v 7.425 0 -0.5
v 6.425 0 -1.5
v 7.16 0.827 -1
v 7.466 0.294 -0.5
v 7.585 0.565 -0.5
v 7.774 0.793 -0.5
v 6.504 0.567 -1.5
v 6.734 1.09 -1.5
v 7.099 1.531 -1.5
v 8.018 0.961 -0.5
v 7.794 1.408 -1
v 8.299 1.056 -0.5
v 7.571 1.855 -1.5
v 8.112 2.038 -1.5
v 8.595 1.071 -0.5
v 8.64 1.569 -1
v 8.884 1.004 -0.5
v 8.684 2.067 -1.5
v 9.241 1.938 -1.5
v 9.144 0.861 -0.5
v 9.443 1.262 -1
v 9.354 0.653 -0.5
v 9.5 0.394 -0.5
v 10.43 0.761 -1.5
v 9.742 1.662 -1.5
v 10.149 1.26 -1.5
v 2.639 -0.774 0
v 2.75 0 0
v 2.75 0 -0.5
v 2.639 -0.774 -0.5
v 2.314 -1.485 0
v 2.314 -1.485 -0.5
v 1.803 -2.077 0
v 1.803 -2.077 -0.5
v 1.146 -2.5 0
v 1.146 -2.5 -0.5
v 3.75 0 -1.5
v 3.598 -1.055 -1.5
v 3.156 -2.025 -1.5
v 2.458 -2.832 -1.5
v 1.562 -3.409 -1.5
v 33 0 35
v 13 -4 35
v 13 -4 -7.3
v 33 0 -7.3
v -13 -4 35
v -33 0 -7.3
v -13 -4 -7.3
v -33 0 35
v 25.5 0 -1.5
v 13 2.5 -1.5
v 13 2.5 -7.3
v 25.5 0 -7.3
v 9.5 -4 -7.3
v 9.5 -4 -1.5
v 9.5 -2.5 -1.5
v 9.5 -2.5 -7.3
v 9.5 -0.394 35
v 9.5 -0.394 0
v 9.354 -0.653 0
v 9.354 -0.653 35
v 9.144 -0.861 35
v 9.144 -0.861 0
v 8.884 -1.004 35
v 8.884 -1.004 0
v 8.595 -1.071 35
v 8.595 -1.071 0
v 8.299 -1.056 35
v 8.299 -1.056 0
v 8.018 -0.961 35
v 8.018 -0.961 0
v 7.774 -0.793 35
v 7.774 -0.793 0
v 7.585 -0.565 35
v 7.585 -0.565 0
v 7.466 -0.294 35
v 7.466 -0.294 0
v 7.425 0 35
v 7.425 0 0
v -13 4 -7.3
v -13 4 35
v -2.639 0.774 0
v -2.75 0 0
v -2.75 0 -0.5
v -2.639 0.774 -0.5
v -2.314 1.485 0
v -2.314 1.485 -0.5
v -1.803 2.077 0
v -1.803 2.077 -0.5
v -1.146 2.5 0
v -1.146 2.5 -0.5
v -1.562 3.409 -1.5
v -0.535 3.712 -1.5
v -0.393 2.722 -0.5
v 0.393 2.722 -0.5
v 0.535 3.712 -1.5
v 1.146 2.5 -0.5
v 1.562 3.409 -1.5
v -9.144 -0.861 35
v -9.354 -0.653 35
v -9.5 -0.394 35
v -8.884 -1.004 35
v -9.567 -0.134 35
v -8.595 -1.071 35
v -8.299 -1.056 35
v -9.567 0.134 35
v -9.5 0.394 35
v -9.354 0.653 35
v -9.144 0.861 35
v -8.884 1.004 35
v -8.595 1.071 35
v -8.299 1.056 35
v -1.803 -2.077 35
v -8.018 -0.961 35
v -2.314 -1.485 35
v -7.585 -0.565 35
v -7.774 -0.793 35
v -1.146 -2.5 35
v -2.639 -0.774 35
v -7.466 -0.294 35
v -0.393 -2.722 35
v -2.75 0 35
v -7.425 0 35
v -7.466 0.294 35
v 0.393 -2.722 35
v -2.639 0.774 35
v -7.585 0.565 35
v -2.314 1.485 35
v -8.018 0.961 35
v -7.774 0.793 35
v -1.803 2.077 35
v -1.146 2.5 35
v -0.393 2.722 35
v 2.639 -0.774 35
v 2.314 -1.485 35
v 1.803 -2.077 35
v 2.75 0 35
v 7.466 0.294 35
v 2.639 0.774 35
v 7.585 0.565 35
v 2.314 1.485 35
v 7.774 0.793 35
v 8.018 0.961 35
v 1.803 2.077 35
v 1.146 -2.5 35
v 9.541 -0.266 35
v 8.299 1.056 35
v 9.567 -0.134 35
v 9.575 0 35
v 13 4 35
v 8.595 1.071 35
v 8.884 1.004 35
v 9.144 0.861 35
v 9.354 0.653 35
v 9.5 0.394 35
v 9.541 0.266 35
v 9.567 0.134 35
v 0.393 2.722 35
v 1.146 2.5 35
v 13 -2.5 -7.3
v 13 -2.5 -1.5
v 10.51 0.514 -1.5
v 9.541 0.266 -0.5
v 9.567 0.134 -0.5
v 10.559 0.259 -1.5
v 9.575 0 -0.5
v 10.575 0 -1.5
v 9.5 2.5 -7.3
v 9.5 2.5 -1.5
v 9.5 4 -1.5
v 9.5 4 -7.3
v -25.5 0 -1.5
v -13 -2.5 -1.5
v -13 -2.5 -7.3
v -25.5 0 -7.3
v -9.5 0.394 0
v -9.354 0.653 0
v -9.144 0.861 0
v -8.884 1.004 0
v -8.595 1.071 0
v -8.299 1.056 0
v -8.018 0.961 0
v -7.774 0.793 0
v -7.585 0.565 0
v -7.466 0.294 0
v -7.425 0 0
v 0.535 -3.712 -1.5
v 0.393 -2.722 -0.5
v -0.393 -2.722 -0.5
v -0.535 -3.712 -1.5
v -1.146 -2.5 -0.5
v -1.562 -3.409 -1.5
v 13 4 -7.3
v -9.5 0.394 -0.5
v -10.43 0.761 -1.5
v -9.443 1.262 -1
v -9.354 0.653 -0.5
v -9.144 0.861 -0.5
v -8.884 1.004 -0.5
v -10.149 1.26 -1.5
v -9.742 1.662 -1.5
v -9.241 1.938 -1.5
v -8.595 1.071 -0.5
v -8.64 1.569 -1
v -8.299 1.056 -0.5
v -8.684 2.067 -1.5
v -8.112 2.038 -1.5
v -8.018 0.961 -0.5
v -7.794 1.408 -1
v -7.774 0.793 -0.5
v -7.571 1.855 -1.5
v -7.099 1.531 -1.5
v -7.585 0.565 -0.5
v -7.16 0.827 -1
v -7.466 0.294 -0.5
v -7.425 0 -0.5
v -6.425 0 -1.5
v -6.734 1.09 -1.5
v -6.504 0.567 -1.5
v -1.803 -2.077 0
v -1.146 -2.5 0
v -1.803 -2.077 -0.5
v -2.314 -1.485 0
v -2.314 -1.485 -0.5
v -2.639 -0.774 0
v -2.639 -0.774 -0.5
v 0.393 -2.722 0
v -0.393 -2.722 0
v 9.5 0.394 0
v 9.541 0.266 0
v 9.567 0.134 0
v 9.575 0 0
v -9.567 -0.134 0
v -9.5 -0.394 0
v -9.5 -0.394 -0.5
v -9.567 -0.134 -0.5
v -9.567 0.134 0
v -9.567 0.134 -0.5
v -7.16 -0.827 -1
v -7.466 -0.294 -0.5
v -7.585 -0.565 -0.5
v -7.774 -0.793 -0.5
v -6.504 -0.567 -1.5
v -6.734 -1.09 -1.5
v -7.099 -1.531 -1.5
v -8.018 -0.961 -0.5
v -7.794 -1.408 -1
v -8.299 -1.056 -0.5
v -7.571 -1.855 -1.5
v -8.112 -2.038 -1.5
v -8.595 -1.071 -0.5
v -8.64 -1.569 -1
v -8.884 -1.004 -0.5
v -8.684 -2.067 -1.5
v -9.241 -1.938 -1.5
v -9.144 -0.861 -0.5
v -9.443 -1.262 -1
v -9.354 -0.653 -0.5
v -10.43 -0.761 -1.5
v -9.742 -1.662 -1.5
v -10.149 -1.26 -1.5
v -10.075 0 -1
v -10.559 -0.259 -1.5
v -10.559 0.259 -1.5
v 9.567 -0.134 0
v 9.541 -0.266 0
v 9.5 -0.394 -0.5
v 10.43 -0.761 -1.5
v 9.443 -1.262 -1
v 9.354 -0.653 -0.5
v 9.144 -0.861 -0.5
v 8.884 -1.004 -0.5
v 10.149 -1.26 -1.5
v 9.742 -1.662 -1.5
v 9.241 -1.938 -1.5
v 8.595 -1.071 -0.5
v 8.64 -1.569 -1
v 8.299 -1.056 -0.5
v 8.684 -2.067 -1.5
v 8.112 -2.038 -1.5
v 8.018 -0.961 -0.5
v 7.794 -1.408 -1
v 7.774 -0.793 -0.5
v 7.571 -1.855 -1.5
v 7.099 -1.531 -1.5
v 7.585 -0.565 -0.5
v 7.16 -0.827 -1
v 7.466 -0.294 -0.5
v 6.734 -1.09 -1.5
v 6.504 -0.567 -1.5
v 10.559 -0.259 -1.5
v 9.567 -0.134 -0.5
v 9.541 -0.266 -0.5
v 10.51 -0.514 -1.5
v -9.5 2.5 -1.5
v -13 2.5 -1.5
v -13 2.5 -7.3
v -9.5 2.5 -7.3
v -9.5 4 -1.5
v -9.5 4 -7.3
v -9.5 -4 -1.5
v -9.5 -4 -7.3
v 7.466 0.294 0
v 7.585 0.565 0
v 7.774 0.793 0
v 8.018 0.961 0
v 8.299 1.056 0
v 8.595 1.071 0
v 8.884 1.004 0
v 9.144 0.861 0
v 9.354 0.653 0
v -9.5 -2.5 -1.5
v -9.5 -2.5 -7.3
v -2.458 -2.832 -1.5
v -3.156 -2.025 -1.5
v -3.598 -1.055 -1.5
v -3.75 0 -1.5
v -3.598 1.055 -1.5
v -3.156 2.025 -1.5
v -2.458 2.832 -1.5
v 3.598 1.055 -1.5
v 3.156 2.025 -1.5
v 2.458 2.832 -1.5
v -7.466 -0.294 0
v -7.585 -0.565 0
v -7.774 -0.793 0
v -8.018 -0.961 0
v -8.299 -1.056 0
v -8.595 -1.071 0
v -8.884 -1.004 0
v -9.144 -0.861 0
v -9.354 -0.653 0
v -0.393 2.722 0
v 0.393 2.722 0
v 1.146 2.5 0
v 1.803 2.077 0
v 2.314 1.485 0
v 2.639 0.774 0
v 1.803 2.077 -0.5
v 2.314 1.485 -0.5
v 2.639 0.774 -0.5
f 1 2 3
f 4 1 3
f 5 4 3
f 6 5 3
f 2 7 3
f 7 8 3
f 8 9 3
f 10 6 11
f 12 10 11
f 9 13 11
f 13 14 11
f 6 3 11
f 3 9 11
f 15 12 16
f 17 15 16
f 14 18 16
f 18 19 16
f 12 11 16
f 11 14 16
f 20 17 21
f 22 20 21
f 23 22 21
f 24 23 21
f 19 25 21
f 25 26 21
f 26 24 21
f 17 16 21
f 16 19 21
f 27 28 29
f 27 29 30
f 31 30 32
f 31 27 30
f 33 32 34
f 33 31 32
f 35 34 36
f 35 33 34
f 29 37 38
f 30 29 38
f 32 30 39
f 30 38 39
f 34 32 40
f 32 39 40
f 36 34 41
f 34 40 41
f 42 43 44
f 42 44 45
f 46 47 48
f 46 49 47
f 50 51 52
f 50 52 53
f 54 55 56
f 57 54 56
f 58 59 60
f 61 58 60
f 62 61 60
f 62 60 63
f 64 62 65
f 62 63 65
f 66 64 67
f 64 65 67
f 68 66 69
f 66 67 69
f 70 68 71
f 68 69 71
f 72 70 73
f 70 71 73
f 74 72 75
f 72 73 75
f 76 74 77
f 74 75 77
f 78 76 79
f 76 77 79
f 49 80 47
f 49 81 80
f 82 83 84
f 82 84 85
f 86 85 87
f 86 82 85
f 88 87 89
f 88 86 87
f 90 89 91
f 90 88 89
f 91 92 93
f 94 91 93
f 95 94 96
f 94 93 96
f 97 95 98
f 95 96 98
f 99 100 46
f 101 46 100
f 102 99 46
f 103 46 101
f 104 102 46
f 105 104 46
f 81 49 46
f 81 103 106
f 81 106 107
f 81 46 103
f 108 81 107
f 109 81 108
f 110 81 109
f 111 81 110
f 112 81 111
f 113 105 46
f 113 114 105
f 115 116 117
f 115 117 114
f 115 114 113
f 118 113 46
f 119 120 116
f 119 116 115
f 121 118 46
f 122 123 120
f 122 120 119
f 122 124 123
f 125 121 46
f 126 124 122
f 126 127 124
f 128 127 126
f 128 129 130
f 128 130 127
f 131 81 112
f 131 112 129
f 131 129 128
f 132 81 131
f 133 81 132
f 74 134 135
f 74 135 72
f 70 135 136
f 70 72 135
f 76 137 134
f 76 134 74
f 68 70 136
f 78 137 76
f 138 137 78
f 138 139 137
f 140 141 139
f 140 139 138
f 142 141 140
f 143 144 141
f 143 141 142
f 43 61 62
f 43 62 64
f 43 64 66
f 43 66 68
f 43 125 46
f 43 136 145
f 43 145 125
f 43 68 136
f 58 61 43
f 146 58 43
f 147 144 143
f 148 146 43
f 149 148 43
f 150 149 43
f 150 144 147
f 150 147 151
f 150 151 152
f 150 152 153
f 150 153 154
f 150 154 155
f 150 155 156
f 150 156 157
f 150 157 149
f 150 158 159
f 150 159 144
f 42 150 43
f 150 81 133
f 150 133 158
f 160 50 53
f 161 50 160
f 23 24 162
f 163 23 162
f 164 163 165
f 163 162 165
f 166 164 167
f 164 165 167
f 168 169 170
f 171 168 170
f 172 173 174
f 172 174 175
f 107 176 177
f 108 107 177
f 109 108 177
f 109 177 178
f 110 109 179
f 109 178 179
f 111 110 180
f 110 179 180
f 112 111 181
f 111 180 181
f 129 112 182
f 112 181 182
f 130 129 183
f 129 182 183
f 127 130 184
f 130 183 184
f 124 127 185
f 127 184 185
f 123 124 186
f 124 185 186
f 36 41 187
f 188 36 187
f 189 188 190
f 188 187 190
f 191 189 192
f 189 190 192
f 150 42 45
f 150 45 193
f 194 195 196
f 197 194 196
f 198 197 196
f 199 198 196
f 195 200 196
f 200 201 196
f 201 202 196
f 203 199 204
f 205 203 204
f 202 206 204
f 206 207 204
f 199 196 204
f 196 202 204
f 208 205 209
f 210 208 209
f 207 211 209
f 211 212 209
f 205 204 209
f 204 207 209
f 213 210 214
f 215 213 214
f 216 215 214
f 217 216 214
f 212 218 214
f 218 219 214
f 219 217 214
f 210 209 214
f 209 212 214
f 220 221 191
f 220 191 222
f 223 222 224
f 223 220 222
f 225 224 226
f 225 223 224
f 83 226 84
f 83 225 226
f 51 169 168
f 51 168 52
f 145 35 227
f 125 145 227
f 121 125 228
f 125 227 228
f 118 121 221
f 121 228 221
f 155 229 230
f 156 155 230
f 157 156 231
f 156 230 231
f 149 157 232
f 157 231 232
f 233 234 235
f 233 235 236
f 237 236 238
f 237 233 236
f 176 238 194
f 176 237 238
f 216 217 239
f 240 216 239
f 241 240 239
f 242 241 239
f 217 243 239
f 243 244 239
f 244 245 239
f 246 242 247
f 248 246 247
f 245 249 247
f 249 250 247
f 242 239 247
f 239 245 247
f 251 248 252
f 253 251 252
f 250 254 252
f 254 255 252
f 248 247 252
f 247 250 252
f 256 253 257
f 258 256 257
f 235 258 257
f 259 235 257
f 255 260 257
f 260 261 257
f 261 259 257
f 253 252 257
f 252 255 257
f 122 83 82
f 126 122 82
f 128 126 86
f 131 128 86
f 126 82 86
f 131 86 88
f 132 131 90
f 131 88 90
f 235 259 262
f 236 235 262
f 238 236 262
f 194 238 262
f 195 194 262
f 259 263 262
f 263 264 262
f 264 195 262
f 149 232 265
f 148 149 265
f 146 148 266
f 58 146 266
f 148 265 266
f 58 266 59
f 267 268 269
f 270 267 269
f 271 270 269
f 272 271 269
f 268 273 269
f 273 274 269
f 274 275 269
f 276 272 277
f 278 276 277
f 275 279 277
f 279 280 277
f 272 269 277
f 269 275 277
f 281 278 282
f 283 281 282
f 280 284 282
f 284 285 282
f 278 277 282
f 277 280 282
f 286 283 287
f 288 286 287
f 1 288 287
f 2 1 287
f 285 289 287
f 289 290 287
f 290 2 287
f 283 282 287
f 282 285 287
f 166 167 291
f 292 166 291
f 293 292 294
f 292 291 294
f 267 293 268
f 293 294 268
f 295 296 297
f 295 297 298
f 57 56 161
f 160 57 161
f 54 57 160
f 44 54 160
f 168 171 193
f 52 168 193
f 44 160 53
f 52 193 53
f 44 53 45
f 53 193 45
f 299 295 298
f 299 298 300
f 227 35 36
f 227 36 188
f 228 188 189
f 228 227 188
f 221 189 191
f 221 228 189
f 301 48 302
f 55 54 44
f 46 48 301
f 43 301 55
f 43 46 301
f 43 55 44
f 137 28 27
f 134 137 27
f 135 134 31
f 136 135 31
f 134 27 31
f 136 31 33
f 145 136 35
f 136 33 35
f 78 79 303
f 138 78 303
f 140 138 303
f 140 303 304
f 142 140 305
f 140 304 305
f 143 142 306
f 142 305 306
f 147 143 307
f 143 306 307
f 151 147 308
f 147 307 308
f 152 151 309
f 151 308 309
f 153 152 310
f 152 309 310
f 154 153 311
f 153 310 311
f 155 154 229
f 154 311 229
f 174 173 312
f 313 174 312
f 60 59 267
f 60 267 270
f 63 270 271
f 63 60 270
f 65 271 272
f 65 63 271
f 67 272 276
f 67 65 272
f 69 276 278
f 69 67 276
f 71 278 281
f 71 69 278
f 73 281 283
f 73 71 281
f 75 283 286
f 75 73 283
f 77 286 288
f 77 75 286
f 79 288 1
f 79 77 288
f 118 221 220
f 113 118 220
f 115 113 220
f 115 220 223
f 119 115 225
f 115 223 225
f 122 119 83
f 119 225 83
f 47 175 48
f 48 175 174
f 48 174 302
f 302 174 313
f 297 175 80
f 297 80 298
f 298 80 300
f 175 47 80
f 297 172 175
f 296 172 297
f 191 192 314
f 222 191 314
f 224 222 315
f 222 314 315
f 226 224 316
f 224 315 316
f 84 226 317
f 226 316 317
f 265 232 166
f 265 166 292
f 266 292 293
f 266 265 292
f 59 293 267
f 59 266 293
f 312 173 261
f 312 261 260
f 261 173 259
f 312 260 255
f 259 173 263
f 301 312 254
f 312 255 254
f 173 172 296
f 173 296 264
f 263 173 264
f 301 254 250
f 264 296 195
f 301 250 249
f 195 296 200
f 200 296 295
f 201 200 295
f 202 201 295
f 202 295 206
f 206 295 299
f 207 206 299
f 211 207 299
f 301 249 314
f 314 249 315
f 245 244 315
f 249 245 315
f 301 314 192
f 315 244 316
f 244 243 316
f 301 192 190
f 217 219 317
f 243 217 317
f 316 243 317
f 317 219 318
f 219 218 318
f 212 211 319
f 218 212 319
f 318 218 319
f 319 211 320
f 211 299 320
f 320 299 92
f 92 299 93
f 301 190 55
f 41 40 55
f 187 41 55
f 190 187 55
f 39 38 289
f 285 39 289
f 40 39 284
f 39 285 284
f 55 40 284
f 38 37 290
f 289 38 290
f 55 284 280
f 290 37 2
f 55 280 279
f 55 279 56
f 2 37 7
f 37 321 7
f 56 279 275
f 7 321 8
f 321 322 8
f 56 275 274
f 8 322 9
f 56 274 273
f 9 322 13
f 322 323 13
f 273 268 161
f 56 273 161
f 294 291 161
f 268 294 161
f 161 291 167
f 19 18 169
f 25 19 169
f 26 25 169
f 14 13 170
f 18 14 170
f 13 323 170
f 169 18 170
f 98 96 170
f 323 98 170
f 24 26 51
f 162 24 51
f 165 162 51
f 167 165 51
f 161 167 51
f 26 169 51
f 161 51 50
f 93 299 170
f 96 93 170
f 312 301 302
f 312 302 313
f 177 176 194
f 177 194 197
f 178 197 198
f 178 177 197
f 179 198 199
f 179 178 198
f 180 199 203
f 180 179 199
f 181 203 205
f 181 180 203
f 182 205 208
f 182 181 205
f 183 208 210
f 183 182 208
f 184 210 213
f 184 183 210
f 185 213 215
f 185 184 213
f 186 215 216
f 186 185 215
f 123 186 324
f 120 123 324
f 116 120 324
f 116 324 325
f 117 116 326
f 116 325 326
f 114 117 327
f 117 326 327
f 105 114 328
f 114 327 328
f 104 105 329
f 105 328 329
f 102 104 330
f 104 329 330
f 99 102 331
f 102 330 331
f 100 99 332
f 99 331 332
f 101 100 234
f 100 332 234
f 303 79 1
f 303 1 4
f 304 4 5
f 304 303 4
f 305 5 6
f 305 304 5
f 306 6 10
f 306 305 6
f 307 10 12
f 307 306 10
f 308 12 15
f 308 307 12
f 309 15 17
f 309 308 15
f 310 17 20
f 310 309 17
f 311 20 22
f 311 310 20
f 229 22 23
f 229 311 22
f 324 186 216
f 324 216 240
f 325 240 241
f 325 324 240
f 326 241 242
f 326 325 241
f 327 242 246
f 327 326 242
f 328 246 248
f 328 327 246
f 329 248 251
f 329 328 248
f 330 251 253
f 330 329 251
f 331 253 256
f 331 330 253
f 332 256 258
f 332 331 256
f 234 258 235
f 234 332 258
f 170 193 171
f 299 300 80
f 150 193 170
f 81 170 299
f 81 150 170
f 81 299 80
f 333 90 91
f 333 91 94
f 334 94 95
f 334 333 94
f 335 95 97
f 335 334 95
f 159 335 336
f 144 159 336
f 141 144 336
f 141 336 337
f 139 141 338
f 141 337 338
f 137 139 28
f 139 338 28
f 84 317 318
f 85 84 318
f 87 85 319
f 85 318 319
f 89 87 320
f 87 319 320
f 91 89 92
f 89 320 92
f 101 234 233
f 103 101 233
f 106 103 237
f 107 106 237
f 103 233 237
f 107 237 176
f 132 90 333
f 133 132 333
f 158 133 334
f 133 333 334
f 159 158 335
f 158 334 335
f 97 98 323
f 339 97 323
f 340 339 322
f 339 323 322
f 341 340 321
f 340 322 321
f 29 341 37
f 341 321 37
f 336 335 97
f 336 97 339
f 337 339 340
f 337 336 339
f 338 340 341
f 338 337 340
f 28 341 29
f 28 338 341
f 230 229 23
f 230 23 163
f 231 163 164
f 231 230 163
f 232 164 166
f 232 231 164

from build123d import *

# Parameters (mm, degrees)
F0_W     = 3.5
F0_H     = 1.5
F1_DEPTH = 35
F2_DEPTH = 1.5
F3_SIZE  = 1
F4_DEPTH = 7.3


with BuildPart() as f1:
    # F0 (on Top) → F1 (new body)
    with BuildSketch(Plane.XY):
        with BuildLine():
            ThreePointArc((-9.5, 0.394493346), (-8.2992202699, 1.0560835668), (-7.425, 0))
            Line((-7.425, 0), (-2.75, 0))
            ThreePointArc((-2.75, 0), (-2.314413618, 1.4852574204), (-1.1456439237, 2.5))
            Line((-1.1456439237, 2.5), (-9.5, 2.5))
            Line((-9.5, 2.5), (-9.5, 0.394493346))
        make_face()
        with BuildLine():
            ThreePointArc((-9.5, -0.394493346), (-9.575, 0), (-9.5, 0.394493346))
            Line((-9.5, 0.394493346), (-9.5, 2.5))
            Line((-9.5, 2.5), (-13, 2.5))
            Line((-13, 2.5), (-13, 0))
            Line((-13, 0), (-13, -2.5))
            Line((-13, -2.5), (-9.5, -2.5))
            Line((-9.5, -2.5), (-9.5, -0.394493346))
        make_face()
        with BuildLine():
            Line((-2.75, 0), (-7.425, 0))
            ThreePointArc((-7.425, 0), (-8.2992202699, -1.0560835668), (-9.5, -0.394493346))
            Line((-9.5, -0.394493346), (-9.5, -2.5))
            Line((-9.5, -2.5), (-1.1456439237, -2.5))
            ThreePointArc((-1.1456439237, -2.5), (-2.314413618, -1.4852574204), (-2.75, 0))
        make_face()
        Polygon((-13, -4), (-13, -2.5), (-25.5, 0), (-33, 0), align=None)
        Polygon((-25.5, 0), (-13, 2.5), (-13, 4), (-33, 0), align=None)
        Polygon((13, -2.5), (13, -4), (33, 0), (25.5, 0), align=None)
        Polygon((33, 0), (13, 4), (13, 2.5), (25.5, 0), align=None)
        Polygon((-25.5, 0), (-13, -2.5), (-13, 0), align=None)
        Polygon((-13, 0), (-13, 2.5), (-25.5, 0), align=None)
        with Locations((-11.25, 3.25)):
            Rectangle(F0_W, F0_H)
        with BuildLine():
            Line((-9.5, 4), (-9.5, 2.5))
            Line((-9.5, 2.5), (-1.1456439237, 2.5))
            ThreePointArc((-1.1456439237, 2.5), (0, 2.75), (1.1456439237, 2.5))
            Line((1.1456439237, 2.5), (9.5, 2.5))
            Line((9.5, 2.5), (9.5, 4))
            Line((9.5, 4), (-9.5, 4))
        make_face()
        with Locations((11.25, 3.25)):
            Rectangle(F0_W, F0_H)
        with Locations((11.25, -3.25)):
            Rectangle(F0_W, F0_H)
        with BuildLine():
            Line((-1.1456439237, -2.5), (-9.5, -2.5))
            Line((-9.5, -2.5), (-9.5, -4))
            Line((-9.5, -4), (9.5, -4))
            Line((9.5, -4), (9.5, -2.5))
            Line((9.5, -2.5), (1.1456439237, -2.5))
            ThreePointArc((1.1456439237, -2.5), (0, -2.75), (-1.1456439237, -2.5))
        make_face()
        with Locations((-11.25, -3.25)):
            Rectangle(F0_W, F0_H)
        Polygon((13, 0), (13, -2.5), (25.5, 0), align=None)
        Polygon((25.5, 0), (13, 2.5), (13, 0), align=None)
        with BuildLine():
            Line((9.5, 2.5), (9.5, 0.394493346))
            ThreePointArc((9.5, 0.394493346), (9.5560835668, 0.2007797301), (9.575, 0))
            ThreePointArc((9.575, 0), (9.5560835668, -0.2007797301), (9.5, -0.394493346))
            Line((9.5, -0.394493346), (9.5, -2.5))
            Line((9.5, -2.5), (13, -2.5))
            Line((13, -2.5), (13, 0))
            Line((13, 0), (13, 2.5))
            Line((13, 2.5), (9.5, 2.5))
        make_face()
        with BuildLine():
            ThreePointArc((1.1456439237, 2.5), (2.314413618, 1.4852574204), (2.75, 0))
            Line((2.75, 0), (7.425, 0))
            ThreePointArc((7.425, 0), (8.2992202699, 1.0560835668), (9.5, 0.394493346))
            Line((9.5, 0.394493346), (9.5, 2.5))
            Line((9.5, 2.5), (1.1456439237, 2.5))
        make_face()
        with BuildLine():
            Line((7.425, 0), (2.75, 0))
            ThreePointArc((2.75, 0), (2.314413618, -1.4852574204), (1.1456439237, -2.5))
            Line((1.1456439237, -2.5), (9.5, -2.5))
            Line((9.5, -2.5), (9.5, -0.394493346))
            ThreePointArc((9.5, -0.394493346), (8.2992202699, -1.0560835668), (7.425, 0))
        make_face()
    extrude(amount=F1_DEPTH)

    # F0 (on Top) → F2 (join)
    with BuildSketch(Plane.XY):
        Polygon((-13, -4), (-13, -2.5), (-25.5, 0), (-33, 0), align=None)
        Polygon((-25.5, 0), (-13, 2.5), (-13, 4), (-33, 0), align=None)
        with Locations((-11.25, 3.25)):
            Rectangle(F0_W, F0_H)
        with BuildLine():
            Line((-9.5, 4), (-9.5, 2.5))
            Line((-9.5, 2.5), (-1.1456439237, 2.5))
            ThreePointArc((-1.1456439237, 2.5), (0, 2.75), (1.1456439237, 2.5))
            Line((1.1456439237, 2.5), (9.5, 2.5))
            Line((9.5, 2.5), (9.5, 4))
            Line((9.5, 4), (-9.5, 4))
        make_face()
        with Locations((11.25, 3.25)):
            Rectangle(F0_W, F0_H)
        Polygon((-13, 0), (-13, 2.5), (-25.5, 0), align=None)
        Polygon((-25.5, 0), (-13, -2.5), (-13, 0), align=None)
        with BuildLine():
            ThreePointArc((-9.5, 0.394493346), (-8.2992202699, 1.0560835668), (-7.425, 0))
            Line((-7.425, 0), (-2.75, 0))
            ThreePointArc((-2.75, 0), (-2.314413618, 1.4852574204), (-1.1456439237, 2.5))
            Line((-1.1456439237, 2.5), (-9.5, 2.5))
            Line((-9.5, 2.5), (-9.5, 0.394493346))
        make_face()
        with BuildLine():
            ThreePointArc((-9.5, -0.394493346), (-9.575, 0), (-9.5, 0.394493346))
            Line((-9.5, 0.394493346), (-9.5, 2.5))
            Line((-9.5, 2.5), (-13, 2.5))
            Line((-13, 2.5), (-13, 0))
            Line((-13, 0), (-13, -2.5))
            Line((-13, -2.5), (-9.5, -2.5))
            Line((-9.5, -2.5), (-9.5, -0.394493346))
        make_face()
        with BuildLine():
            Line((-2.75, 0), (-7.425, 0))
            ThreePointArc((-7.425, 0), (-8.2992202699, -1.0560835668), (-9.5, -0.394493346))
            Line((-9.5, -0.394493346), (-9.5, -2.5))
            Line((-9.5, -2.5), (-1.1456439237, -2.5))
            ThreePointArc((-1.1456439237, -2.5), (-2.314413618, -1.4852574204), (-2.75, 0))
        make_face()
        with Locations((11.25, -3.25)):
            Rectangle(F0_W, F0_H)
        with BuildLine():
            Line((-1.1456439237, -2.5), (-9.5, -2.5))
            Line((-9.5, -2.5), (-9.5, -4))
            Line((-9.5, -4), (9.5, -4))
            Line((9.5, -4), (9.5, -2.5))
            Line((9.5, -2.5), (1.1456439237, -2.5))
            ThreePointArc((1.1456439237, -2.5), (0, -2.75), (-1.1456439237, -2.5))
        make_face()
        with Locations((-11.25, -3.25)):
            Rectangle(F0_W, F0_H)
        Polygon((13, -2.5), (13, -4), (33, 0), (25.5, 0), align=None)
        Polygon((13, 0), (13, -2.5), (25.5, 0), align=None)
        Polygon((25.5, 0), (13, 2.5), (13, 0), align=None)
        Polygon((33, 0), (13, 4), (13, 2.5), (25.5, 0), align=None)
        with BuildLine():
            ThreePointArc((1.1456439237, 2.5), (2.314413618, 1.4852574204), (2.75, 0))
            Line((2.75, 0), (7.425, 0))
            ThreePointArc((7.425, 0), (8.2992202699, 1.0560835668), (9.5, 0.394493346))
            Line((9.5, 0.394493346), (9.5, 2.5))
            Line((9.5, 2.5), (1.1456439237, 2.5))
        make_face()
        with BuildLine():
            Line((7.425, 0), (2.75, 0))
            ThreePointArc((2.75, 0), (2.314413618, -1.4852574204), (1.1456439237, -2.5))
            Line((1.1456439237, -2.5), (9.5, -2.5))
            Line((9.5, -2.5), (9.5, -0.394493346))
            ThreePointArc((9.5, -0.394493346), (8.2992202699, -1.0560835668), (7.425, 0))
        make_face()
        with BuildLine():
            Line((9.5, 2.5), (9.5, 0.394493346))
            ThreePointArc((9.5, 0.394493346), (9.5560835668, 0.2007797301), (9.575, 0))
            ThreePointArc((9.575, 0), (9.5560835668, -0.2007797301), (9.5, -0.394493346))
            Line((9.5, -0.394493346), (9.5, -2.5))
            Line((9.5, -2.5), (13, -2.5))
            Line((13, -2.5), (13, 0))
            Line((13, 0), (13, 2.5))
            Line((13, 2.5), (9.5, 2.5))
        make_face()
    extrude(amount=-F2_DEPTH)

    # F3
    f3_edges = [f1.edges().sort_by_distance(p)[0] for p in [
        (-9.575, 0, -1.5),
        (7.5, -0.394493, -1.5),
        (1.145644, -2.5, -1.5),
    ]]
    chamfer(f3_edges, length=F3_SIZE)

    # F0 (on Top) → F4 (join)
    with BuildSketch(Plane.XY):
        with Locations((-11.25, 3.25)):
            Rectangle(F0_W, F0_H)
        with Locations((11.25, 3.25)):
            Rectangle(F0_W, F0_H)
        Polygon((-25.5, 0), (-13, 2.5), (-13, 4), (-33, 0), align=None)
        Polygon((-13, -4), (-13, -2.5), (-25.5, 0), (-33, 0), align=None)
        with Locations((11.25, -3.25)):
            Rectangle(F0_W, F0_H)
        with Locations((-11.25, -3.25)):
            Rectangle(F0_W, F0_H)
        Polygon((33, 0), (13, 4), (13, 2.5), (25.5, 0), align=None)
        Polygon((13, -2.5), (13, -4), (33, 0), (25.5, 0), align=None)
    extrude(amount=-F4_DEPTH)


solid = f1.part
